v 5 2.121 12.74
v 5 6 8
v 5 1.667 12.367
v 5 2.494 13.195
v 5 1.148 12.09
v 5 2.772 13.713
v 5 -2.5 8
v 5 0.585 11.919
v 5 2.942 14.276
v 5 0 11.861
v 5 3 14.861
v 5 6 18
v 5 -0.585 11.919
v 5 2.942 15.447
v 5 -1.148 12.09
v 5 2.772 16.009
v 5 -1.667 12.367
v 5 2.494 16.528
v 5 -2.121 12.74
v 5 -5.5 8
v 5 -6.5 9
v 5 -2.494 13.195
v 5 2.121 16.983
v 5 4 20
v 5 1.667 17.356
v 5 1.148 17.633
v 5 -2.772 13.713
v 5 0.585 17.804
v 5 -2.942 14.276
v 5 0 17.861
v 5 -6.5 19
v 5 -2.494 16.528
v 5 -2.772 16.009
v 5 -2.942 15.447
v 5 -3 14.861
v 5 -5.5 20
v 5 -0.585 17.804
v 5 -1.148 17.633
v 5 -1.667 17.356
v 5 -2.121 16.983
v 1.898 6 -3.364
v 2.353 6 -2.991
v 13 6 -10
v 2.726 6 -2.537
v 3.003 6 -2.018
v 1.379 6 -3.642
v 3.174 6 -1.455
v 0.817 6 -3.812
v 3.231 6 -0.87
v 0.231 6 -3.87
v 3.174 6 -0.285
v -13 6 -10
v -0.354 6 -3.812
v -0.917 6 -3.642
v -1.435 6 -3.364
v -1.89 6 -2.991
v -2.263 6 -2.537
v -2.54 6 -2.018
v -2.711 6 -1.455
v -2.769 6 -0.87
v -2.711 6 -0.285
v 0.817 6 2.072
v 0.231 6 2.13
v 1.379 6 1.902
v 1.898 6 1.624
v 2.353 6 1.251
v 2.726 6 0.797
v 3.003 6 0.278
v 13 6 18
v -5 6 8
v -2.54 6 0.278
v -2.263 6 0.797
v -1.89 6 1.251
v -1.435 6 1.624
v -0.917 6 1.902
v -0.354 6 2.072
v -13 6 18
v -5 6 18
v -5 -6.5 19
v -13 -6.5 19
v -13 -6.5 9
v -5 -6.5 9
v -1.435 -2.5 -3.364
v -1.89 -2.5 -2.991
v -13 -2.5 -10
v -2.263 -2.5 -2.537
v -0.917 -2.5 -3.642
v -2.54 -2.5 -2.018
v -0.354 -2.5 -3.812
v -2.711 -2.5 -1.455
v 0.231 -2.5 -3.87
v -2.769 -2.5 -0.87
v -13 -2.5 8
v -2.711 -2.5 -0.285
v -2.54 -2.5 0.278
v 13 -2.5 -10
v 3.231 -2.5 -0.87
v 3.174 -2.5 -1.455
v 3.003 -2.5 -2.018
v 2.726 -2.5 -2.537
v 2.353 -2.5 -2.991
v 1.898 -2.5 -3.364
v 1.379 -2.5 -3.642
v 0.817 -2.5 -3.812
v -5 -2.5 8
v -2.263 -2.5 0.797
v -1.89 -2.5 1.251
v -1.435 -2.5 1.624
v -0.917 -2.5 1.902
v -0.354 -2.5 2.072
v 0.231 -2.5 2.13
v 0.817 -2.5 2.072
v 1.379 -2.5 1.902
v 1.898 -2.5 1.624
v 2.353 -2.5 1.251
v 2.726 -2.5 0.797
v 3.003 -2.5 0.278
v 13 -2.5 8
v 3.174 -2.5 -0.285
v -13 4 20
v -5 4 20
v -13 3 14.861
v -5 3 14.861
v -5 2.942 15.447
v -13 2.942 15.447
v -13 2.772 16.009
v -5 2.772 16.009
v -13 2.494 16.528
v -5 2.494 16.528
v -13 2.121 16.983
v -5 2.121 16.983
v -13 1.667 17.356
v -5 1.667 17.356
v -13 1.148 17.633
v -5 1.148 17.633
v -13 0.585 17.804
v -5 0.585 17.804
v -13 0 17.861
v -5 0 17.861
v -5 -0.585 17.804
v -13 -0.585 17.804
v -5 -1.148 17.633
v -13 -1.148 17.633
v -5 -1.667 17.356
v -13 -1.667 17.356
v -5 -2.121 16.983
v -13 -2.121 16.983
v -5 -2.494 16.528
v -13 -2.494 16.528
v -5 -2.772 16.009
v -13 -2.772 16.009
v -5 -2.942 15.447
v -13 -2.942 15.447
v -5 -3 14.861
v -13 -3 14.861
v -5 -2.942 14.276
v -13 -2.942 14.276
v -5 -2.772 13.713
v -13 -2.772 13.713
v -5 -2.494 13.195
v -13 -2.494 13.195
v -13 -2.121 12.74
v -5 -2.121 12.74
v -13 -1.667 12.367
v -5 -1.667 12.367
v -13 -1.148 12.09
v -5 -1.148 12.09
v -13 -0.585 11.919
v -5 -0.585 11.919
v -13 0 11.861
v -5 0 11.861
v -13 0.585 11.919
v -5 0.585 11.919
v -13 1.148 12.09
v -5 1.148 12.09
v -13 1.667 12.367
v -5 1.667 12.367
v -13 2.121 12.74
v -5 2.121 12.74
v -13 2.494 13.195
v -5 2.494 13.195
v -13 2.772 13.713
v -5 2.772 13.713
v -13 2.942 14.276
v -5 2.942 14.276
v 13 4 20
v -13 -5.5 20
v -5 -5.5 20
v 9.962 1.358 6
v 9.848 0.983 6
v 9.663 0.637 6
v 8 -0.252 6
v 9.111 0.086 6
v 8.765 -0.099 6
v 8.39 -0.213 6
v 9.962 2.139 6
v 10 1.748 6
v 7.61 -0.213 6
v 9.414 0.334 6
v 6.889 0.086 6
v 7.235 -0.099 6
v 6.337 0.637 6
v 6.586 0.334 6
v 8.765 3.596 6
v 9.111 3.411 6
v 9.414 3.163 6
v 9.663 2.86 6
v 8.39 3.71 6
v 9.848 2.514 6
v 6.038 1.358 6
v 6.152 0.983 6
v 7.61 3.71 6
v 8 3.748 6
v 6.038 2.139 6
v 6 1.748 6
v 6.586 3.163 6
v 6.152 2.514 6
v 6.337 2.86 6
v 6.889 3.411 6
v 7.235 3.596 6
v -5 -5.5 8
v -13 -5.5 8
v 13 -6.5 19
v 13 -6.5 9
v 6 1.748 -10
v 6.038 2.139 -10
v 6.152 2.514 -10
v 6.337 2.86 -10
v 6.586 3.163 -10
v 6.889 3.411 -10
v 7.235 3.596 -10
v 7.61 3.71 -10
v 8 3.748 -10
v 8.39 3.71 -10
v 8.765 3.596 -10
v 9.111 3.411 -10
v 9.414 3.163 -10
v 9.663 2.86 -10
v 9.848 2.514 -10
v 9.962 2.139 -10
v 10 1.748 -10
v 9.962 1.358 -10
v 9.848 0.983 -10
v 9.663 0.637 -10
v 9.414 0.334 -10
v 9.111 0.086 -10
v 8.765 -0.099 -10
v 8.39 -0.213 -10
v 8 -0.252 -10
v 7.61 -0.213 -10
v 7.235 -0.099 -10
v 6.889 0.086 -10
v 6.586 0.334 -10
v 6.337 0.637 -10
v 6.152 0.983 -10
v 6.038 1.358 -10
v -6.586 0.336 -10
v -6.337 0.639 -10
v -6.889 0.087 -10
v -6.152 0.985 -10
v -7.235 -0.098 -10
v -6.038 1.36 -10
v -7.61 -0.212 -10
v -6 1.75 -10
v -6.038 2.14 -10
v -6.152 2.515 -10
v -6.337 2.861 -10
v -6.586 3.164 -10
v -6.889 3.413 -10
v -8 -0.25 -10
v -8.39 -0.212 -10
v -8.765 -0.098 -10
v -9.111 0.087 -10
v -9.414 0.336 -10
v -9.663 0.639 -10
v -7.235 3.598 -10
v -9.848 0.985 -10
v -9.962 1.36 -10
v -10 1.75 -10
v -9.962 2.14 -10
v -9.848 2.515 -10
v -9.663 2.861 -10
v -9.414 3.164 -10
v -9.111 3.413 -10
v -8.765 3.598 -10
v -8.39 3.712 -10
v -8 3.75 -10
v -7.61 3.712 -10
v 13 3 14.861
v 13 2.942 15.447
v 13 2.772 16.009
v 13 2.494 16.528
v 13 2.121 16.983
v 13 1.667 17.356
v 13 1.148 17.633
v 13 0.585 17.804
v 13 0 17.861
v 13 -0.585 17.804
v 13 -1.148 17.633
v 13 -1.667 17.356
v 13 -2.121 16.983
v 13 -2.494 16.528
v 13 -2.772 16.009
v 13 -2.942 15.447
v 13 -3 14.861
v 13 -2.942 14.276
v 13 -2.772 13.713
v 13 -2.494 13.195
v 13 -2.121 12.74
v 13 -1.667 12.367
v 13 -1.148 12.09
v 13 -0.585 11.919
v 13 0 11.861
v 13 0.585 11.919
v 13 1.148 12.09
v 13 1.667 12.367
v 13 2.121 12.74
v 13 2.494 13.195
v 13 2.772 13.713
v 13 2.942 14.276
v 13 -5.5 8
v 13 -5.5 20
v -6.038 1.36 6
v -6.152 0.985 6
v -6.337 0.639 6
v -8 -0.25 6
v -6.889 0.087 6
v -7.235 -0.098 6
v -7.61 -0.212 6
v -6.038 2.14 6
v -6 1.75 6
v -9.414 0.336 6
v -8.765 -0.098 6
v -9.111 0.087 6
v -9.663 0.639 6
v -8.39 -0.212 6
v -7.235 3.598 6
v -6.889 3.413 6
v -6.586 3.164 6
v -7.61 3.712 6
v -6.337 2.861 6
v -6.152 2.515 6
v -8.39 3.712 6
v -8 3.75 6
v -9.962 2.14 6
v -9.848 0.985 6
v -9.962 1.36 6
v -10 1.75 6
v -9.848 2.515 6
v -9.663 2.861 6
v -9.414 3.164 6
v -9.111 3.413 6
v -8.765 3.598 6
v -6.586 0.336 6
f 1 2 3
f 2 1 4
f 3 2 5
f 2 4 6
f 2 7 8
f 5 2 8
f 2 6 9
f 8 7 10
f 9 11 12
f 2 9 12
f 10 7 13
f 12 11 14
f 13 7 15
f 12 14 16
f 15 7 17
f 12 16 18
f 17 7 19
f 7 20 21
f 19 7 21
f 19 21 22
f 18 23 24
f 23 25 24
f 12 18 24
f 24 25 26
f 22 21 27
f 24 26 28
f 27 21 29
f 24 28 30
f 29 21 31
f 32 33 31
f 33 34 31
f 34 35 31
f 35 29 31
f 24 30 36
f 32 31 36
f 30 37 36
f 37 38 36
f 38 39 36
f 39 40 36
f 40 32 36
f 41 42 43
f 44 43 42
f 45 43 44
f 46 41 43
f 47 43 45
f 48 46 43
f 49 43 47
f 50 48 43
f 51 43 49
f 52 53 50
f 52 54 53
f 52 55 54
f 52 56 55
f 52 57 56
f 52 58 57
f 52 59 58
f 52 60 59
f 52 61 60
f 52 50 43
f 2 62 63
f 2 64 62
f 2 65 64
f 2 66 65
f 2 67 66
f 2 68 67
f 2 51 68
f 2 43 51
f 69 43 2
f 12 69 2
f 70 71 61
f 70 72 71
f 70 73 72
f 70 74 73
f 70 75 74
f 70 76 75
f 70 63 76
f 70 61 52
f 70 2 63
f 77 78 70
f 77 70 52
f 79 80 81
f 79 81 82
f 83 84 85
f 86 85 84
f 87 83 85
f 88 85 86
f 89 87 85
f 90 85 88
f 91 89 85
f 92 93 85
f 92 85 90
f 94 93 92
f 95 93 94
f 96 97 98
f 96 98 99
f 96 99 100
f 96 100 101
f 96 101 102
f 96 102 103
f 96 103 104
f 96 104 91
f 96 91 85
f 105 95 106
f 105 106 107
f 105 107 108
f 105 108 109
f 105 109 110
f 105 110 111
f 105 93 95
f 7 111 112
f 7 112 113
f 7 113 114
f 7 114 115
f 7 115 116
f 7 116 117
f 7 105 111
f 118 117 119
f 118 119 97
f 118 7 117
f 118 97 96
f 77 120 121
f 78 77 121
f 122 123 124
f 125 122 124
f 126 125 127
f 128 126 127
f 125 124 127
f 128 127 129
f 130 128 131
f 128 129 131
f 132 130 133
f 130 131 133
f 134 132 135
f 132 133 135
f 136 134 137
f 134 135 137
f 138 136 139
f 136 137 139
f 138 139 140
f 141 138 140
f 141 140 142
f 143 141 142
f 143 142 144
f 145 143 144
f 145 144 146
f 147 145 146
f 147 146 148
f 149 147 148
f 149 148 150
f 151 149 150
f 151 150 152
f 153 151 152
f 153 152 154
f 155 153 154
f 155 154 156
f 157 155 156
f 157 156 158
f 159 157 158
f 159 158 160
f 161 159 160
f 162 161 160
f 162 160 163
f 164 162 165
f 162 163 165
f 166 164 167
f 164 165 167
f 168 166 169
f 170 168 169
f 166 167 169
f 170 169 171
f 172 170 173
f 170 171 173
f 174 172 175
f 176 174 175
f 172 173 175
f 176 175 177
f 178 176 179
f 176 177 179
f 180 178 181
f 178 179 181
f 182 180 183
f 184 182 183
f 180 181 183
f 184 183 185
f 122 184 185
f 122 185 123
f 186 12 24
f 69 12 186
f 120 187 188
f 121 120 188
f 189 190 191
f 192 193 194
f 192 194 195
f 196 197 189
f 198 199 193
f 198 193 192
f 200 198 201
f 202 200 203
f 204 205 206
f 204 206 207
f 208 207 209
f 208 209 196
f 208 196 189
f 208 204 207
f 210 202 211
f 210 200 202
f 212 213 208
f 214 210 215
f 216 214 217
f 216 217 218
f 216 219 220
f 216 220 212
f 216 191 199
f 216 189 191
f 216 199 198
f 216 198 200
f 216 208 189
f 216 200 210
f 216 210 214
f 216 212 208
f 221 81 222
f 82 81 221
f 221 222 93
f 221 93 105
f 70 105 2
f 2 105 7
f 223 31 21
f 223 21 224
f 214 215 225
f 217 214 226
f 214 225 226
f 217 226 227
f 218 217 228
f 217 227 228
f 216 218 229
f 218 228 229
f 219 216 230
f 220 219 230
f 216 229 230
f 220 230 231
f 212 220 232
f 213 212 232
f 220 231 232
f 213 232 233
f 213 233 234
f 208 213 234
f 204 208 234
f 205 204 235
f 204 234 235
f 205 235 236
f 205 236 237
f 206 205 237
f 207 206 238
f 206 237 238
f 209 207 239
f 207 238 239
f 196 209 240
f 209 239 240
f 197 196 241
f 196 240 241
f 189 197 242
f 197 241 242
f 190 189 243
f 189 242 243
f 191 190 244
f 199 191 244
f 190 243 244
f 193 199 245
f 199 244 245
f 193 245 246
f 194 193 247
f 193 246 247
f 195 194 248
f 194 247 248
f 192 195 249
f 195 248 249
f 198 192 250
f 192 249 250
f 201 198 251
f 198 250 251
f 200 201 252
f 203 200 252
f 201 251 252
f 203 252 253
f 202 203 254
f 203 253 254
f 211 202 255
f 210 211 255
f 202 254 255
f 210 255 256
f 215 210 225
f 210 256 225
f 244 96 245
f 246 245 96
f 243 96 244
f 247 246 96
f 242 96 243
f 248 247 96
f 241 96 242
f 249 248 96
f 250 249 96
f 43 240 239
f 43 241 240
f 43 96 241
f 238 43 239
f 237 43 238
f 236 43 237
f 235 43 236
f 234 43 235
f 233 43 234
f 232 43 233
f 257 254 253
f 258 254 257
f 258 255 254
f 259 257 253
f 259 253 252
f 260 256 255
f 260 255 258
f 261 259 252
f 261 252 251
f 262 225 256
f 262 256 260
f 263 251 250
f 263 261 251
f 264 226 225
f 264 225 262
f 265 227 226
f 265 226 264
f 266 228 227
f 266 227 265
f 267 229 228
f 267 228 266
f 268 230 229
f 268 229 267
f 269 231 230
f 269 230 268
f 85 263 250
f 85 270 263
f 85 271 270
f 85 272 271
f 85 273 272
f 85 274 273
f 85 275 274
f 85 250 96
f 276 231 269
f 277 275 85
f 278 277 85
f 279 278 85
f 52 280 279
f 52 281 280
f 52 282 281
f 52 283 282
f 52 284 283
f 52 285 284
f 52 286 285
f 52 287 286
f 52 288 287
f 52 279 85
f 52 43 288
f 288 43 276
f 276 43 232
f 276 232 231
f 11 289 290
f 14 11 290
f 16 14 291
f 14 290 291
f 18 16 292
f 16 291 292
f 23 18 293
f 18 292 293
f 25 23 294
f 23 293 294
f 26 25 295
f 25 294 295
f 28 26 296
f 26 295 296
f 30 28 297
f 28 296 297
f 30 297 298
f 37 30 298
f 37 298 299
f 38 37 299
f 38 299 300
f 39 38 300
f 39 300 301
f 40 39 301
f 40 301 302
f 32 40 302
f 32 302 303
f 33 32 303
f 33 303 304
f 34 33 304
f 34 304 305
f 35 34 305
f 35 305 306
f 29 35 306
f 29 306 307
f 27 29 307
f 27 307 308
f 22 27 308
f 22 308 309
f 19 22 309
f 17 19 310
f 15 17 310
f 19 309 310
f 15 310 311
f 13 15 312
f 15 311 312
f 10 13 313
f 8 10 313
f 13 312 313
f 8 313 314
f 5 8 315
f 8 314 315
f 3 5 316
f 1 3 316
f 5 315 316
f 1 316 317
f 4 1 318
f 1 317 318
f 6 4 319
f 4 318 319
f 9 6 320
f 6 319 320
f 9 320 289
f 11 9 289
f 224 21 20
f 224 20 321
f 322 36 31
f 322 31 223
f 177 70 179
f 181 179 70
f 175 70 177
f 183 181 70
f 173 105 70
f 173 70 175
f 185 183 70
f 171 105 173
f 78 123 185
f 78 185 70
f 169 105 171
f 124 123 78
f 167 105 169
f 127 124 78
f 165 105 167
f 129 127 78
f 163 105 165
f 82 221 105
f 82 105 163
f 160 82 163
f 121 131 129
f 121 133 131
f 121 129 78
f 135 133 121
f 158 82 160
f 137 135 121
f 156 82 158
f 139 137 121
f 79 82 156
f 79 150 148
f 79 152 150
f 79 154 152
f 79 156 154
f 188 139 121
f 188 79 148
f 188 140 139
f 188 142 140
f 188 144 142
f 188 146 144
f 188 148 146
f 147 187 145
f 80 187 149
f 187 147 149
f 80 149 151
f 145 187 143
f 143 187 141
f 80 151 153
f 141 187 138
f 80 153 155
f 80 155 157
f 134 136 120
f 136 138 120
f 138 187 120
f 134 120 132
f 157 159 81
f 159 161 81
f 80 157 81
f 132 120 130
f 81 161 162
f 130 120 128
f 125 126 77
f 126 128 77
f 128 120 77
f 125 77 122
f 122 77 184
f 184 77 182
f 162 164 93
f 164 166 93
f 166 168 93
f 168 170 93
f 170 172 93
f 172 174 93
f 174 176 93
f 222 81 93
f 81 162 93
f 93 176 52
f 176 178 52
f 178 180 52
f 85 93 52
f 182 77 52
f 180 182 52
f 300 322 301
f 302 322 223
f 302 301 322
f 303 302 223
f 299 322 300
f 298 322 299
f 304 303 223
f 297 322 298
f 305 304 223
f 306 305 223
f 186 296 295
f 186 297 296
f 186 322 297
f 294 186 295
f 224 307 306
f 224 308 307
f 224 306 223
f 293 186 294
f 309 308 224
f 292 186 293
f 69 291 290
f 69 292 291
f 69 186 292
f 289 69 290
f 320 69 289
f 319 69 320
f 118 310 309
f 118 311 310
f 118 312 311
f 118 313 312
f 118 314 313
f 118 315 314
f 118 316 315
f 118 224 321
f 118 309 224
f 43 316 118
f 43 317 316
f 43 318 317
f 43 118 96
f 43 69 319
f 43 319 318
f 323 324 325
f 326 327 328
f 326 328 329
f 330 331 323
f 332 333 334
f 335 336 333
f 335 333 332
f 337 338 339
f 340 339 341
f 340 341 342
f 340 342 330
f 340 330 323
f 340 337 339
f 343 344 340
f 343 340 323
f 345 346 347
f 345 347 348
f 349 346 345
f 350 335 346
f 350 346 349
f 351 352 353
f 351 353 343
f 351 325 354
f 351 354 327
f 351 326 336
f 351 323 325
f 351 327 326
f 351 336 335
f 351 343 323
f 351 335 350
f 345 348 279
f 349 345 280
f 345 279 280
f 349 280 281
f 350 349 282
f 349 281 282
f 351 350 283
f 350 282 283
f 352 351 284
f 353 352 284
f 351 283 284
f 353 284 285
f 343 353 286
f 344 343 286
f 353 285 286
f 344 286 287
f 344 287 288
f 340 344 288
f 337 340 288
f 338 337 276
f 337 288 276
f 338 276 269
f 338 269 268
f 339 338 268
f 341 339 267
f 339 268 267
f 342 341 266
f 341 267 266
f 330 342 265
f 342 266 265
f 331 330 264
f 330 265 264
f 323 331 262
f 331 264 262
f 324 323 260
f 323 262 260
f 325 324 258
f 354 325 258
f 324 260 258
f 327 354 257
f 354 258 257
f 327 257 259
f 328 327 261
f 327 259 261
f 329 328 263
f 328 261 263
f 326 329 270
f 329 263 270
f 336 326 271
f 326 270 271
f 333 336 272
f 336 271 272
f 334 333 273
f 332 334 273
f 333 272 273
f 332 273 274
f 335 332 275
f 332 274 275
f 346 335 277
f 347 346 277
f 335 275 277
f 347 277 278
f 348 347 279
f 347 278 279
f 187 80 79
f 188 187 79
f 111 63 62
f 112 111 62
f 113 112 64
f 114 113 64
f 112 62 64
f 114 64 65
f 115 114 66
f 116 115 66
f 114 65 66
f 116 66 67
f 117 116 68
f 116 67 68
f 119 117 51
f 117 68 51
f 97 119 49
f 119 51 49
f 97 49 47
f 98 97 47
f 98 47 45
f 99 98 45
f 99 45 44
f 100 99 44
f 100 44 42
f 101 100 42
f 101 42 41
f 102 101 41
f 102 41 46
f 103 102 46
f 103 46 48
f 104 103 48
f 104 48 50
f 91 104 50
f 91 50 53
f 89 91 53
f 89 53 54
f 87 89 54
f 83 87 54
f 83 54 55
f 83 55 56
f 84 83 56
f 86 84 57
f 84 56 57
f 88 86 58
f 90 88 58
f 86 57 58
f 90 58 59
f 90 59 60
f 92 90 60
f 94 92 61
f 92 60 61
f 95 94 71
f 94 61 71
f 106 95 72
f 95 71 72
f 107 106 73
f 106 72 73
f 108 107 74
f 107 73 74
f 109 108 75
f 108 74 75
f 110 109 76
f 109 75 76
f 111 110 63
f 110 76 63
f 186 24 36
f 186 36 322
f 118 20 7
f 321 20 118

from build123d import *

# Parameters (mm, degrees)
SKETCH_1_W            = 30
SKETCH_1_H            = 13.5
EXTRUDE_1_DEPTH       = 20
SKETCH_2_W            = 10
SKETCH_2_H            = 20.163242361
CUT_EXTRUDE_2_DEPTH   = 29.41214529
SKETCH_3_R            = 3
CUT_EXTRUDE_3_DEPTH   = 37.827299657
SKETCH_6_W            = 30
SKETCH_6_H            = 13.5
EXTRUDE_5_DEPTH       = 10
SKETCH_7_R            = 3
CUT_EXTRUDE_1_DEPTH   = 29.41214529
SKETCH_8_W            = 30
SKETCH_8_H            = 18
CUT_EXTRUDE_2_2_DEPTH = 5
CHAMFER_1_SIZE        = 2
SKETCH_9_W            = 6.52399098
SKETCH_9_H            = 33.458140235
CUT_EXTRUDE_6_DEPTH   = 29.41214529
SKETCH_14_W           = 84.903926308
SKETCH_14_H           = 44.963333207
CUT_EXTRUDE_10_DEPTH  = 1
SKETCH_15_R           = 2.000000004
CUT_EXTRUDE_3_2_DEPTH = 16


with BuildPart() as part:
    # Эскиз1 → Вытянуть1 (new body)
    with BuildSketch(Plane.XY):
        with Locations((0, -0.75)):
            Rectangle(SKETCH_1_W, SKETCH_1_H)
    extrude(amount=EXTRUDE_1_DEPTH)

    # Эскиз2 → Cut-Extrude 2 (cut, through all)
    with BuildSketch(Plane.XZ.offset(7.5)):
        with Locations((0, 18.081621181)):
            Rectangle(SKETCH_2_W, SKETCH_2_H)
    extrude(amount=-CUT_EXTRUDE_2_DEPTH, mode=Mode.SUBTRACT)

    # Эскиз3 → Cut-Extrude 3 (cut, through all)
    with BuildSketch(Plane(origin=(15, 0, 0), x_dir=(0, 0, -1), z_dir=(1, 0, 0))):
        with Locations(Location((-14.861357689, 0, 0), (0, 0, 90))):
            Circle(SKETCH_3_R)
    extrude(amount=-CUT_EXTRUDE_3_DEPTH, mode=Mode.SUBTRACT)

    # Эскиз6 → Вытянуть5 (add)
    with BuildSketch(Plane(origin=(0, 0, 0), x_dir=(-1, 0, 0), z_dir=(0, 0, -1))):
        with Locations((0, -0.75)):
            Rectangle(SKETCH_6_W, SKETCH_6_H)
    extrude(amount=EXTRUDE_5_DEPTH)

    # Эскиз7 → Вырез-Вытянуть1 (cut, through all)
    with BuildSketch(Plane(origin=(0, 6, 0), x_dir=(1, 0, 0), z_dir=(0, 1, 0))):
        with Locations(Location((0.231400022, 0.869933179, 0), (0, 0, 270))):
            Circle(SKETCH_7_R)
    extrude(amount=-CUT_EXTRUDE_1_DEPTH, mode=Mode.SUBTRACT)

    # Эскиз8 → Cut-Extrude 2 2 (cut)
    with BuildSketch(Plane.XZ.offset(7.5)):
        with Locations((0, -1)):
            Rectangle(SKETCH_8_W, SKETCH_8_H)
    extrude(amount=-CUT_EXTRUDE_2_2_DEPTH, mode=Mode.SUBTRACT)

    # Фаска1
    chamfer_1_edges = [part.edges().sort_by_distance(p)[0] for p in [
        (-10, -7.5, 20),
        (-10, 6, 20),
        (10, -7.5, 20),
        (10, -7.5, 8),
        (-10, -7.5, 8),
        (10, 6, 20),
    ]]
    chamfer(chamfer_1_edges, length=CHAMFER_1_SIZE)

    # Эскиз9 → Вытянуть6 (cut, through all)
    with BuildSketch(Plane(origin=(0, 6, 0), x_dir=(1, 0, 0), z_dir=(0, 1, 0))):
        with Locations((16.26199549, -3.329208479)):
            Rectangle(SKETCH_9_W, SKETCH_9_H)
        with Locations((-16.26199549, -3.329208479)):
            Rectangle(SKETCH_9_W, SKETCH_9_H)
    extrude(amount=-CUT_EXTRUDE_6_DEPTH, mode=Mode.SUBTRACT)

    # Эскиз14 → Вытянуть10 (cut)
    with BuildSketch(Plane.XZ.offset(7.5)):
        with Locations((0.061866905, -0.327668242)):
            Rectangle(SKETCH_14_W, SKETCH_14_H)
    extrude(amount=-CUT_EXTRUDE_10_DEPTH, mode=Mode.SUBTRACT)

    # Эскиз15 → Cut-Extrude 3 2 (cut)
    with BuildSketch(Plane(origin=(0, 0, -10), x_dir=(-1, 0, 0), z_dir=(0, 0, -1))):
        with Locations((-7.999999896, 1.748498224)):
            Circle(SKETCH_15_R)
        with Locations((8.000000104, 1.750000003)):
            Circle(SKETCH_15_R)
    extrude(amount=-CUT_EXTRUDE_3_2_DEPTH, mode=Mode.SUBTRACT)


solid = part.part
